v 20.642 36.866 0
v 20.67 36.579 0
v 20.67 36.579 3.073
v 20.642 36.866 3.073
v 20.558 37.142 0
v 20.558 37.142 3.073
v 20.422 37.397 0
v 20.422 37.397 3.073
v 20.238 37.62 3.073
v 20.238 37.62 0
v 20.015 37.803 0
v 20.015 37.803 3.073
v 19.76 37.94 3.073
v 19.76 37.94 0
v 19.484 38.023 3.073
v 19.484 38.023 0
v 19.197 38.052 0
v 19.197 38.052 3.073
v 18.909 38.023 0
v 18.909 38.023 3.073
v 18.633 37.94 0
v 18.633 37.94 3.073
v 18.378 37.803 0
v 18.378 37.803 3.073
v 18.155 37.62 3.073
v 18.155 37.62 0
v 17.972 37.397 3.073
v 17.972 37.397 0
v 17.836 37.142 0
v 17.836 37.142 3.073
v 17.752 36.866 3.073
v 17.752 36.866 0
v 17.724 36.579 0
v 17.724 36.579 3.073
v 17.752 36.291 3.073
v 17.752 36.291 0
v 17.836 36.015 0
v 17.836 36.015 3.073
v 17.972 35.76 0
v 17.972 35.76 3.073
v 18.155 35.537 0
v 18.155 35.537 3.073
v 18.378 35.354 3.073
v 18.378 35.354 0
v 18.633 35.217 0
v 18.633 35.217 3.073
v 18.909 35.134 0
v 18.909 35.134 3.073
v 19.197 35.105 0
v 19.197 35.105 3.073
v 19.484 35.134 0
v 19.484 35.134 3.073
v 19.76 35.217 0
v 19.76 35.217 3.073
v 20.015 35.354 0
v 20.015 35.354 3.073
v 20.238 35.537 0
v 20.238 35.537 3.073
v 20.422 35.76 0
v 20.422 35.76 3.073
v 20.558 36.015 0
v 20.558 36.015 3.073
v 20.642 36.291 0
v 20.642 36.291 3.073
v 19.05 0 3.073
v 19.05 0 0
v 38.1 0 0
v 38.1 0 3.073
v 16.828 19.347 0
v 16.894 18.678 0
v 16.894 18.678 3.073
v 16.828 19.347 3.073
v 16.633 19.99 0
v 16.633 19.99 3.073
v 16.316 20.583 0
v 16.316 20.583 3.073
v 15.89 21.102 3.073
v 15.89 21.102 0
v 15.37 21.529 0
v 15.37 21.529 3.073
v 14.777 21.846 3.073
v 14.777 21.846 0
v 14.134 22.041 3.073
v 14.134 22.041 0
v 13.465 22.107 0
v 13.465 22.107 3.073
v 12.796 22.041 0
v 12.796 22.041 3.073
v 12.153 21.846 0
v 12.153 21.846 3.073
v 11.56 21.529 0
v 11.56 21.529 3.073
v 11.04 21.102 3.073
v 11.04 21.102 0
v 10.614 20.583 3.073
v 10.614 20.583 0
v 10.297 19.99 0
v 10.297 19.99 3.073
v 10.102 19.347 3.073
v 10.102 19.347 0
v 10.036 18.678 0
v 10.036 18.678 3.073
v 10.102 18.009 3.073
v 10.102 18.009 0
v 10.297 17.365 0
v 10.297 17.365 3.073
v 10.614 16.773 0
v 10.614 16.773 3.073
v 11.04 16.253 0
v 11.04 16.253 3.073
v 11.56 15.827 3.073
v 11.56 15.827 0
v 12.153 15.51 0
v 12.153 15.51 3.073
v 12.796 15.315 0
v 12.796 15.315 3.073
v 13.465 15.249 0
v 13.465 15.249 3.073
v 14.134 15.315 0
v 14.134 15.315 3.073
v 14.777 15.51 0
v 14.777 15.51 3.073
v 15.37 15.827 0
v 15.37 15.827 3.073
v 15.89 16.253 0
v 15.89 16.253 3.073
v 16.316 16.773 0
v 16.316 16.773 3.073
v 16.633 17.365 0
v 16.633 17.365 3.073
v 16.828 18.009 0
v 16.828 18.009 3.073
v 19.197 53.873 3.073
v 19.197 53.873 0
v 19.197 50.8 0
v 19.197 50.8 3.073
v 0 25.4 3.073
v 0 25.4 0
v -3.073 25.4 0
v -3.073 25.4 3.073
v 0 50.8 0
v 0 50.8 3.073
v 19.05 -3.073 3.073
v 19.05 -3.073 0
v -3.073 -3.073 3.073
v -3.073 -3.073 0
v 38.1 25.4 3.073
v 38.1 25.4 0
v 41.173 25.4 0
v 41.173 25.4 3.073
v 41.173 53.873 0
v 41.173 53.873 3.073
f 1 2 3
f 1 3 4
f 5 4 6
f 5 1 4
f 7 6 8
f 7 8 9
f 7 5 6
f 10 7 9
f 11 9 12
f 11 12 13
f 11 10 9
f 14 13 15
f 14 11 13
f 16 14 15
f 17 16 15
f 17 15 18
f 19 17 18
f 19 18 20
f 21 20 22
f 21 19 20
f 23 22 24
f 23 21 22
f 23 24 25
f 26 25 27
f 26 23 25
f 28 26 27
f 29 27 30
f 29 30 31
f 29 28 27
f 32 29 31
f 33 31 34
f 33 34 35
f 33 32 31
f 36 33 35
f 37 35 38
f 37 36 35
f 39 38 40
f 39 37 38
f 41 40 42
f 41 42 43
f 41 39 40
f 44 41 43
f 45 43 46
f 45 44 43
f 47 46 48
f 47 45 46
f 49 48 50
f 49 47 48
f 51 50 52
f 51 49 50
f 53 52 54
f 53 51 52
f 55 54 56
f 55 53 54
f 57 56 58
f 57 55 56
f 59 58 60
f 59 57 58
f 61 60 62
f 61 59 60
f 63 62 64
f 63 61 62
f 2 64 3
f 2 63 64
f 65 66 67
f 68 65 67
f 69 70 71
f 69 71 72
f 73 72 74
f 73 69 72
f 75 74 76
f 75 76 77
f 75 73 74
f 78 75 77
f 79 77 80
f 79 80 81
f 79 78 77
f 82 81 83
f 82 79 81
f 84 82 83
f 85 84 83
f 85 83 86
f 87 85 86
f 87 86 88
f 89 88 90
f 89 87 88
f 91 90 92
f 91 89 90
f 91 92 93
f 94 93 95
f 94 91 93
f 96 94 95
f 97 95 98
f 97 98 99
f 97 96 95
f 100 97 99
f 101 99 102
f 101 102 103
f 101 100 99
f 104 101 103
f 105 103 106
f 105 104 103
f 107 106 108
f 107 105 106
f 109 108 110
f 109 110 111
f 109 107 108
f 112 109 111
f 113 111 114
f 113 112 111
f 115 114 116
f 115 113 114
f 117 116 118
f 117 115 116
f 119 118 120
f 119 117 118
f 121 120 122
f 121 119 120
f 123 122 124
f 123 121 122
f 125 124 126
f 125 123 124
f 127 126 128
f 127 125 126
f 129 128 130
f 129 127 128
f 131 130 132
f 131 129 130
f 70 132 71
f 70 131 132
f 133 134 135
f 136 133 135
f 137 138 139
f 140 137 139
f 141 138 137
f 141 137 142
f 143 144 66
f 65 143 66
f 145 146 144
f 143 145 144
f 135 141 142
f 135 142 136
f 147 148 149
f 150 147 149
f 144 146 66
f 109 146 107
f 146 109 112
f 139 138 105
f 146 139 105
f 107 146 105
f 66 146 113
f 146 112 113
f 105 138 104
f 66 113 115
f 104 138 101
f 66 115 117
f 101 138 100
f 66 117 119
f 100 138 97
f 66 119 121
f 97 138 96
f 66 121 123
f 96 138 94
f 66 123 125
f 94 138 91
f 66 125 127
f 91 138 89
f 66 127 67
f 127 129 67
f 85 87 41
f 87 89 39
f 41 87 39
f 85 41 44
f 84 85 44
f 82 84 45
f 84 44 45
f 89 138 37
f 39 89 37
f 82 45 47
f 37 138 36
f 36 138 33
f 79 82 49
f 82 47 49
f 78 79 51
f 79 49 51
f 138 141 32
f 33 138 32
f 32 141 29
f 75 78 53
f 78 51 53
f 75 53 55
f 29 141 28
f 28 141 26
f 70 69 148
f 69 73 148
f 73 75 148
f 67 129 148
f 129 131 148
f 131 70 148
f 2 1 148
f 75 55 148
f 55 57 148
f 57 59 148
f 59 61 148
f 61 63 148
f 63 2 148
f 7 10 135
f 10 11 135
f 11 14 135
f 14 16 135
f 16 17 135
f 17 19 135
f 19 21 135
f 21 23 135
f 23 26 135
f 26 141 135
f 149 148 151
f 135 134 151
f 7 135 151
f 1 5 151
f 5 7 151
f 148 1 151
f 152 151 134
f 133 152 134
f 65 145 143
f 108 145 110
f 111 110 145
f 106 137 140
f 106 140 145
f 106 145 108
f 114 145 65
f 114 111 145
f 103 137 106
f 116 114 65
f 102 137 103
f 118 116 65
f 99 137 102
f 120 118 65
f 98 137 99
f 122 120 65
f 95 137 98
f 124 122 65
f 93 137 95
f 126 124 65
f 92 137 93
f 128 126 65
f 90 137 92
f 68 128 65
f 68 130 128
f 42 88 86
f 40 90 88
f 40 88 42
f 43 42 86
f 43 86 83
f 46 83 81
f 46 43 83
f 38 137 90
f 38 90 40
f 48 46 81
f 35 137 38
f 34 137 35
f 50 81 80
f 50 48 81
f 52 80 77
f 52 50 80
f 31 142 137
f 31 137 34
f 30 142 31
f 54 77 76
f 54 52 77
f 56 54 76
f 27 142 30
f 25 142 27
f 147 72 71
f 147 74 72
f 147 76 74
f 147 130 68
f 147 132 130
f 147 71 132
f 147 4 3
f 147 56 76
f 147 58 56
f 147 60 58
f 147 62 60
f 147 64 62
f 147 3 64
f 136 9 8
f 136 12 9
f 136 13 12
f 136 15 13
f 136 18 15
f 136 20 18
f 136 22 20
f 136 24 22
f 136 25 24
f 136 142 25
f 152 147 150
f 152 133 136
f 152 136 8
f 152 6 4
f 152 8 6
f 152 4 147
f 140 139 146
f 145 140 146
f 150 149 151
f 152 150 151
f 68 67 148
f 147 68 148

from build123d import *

# Parameters (mm, degrees)
BACKSKETCH_R        = 3.429
BACKSKETCH_R_2      = 1.4732
BOSS_EXTRUDE1_DEPTH = 3.0734


with BuildPart() as part:
    # backSketch → Boss-Extrude1 (new body)
    with BuildSketch(Plane.XY):
        Polygon((0, 50.8), (0, 25.4), (-3.0734, 25.4), (-3.0734, -3.0734), (19.05, -3.0734), (19.05, 0), (38.1, 0), (38.1, 25.4), (41.1734, 25.4), (41.1734, 53.8734), (19.196716748, 53.8734), (19.196716748, 50.8), align=None)
        with Locations((13.465150567, 18.677705992)):
            Circle(BACKSKETCH_R, mode=Mode.SUBTRACT)
        with Locations((19.196716748, 36.578509469)):
            Circle(BACKSKETCH_R_2, mode=Mode.SUBTRACT)
    extrude(amount=BOSS_EXTRUDE1_DEPTH)


solid = part.part
